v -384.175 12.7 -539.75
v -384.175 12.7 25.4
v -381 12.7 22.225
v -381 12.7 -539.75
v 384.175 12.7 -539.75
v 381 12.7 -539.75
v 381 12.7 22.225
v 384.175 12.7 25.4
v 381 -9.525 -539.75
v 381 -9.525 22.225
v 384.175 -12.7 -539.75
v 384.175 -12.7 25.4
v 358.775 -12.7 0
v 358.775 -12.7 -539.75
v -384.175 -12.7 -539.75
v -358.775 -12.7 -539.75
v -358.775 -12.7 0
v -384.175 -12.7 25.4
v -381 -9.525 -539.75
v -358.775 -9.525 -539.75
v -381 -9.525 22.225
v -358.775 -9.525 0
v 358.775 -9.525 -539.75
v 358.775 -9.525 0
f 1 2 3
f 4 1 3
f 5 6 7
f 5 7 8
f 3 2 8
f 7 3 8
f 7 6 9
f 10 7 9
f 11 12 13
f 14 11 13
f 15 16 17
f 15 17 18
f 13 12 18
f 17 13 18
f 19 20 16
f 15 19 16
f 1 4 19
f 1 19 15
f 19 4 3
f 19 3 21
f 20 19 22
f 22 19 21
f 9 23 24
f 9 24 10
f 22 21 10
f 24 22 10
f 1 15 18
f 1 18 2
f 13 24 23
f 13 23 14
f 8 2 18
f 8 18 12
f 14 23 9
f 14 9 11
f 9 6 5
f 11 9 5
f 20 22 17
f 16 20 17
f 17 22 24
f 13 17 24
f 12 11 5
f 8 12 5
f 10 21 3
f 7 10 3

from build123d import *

# Parameters (mm, degrees)
F0_W     = 768.35
F0_H     = 25.4
F1_DEPTH = 25.4
F2_W     = 22.225
F2_H     = 22.225
F3_DEPTH = 768.351
F5_DEPTH = 565.15


with BuildPart() as f1:
    # F0 (on Top) → F1 (new body)
    with BuildSketch(Plane.XY):
        Rectangle(F0_W, F0_H)
    extrude(amount=F1_DEPTH)

    # F2 (on face) → F3 (cut, through all)
    with BuildSketch(Plane.YZ.offset(384.175)):
        with Locations((1.5875, 11.1125)):
            Rectangle(F2_W, F2_H)
    extrude(amount=-F3_DEPTH, mode=Mode.SUBTRACT)

    # F4 (on face) → F5 (join)
    with BuildSketch(Plane.XY.offset(25.4)):
        Polygon((384.175, -12.7), (384.175, 12.7), (381, 12.7), (381, -9.525), (358.775, -9.525), (358.775, -12.7), align=None)
    extrude(amount=-F5_DEPTH)

    # F6: F1 across plane


with BuildPart() as f1_1:
    add(f1.part)
    add(f1.part.mirror(Plane.YZ))


solid = f1_1.part
